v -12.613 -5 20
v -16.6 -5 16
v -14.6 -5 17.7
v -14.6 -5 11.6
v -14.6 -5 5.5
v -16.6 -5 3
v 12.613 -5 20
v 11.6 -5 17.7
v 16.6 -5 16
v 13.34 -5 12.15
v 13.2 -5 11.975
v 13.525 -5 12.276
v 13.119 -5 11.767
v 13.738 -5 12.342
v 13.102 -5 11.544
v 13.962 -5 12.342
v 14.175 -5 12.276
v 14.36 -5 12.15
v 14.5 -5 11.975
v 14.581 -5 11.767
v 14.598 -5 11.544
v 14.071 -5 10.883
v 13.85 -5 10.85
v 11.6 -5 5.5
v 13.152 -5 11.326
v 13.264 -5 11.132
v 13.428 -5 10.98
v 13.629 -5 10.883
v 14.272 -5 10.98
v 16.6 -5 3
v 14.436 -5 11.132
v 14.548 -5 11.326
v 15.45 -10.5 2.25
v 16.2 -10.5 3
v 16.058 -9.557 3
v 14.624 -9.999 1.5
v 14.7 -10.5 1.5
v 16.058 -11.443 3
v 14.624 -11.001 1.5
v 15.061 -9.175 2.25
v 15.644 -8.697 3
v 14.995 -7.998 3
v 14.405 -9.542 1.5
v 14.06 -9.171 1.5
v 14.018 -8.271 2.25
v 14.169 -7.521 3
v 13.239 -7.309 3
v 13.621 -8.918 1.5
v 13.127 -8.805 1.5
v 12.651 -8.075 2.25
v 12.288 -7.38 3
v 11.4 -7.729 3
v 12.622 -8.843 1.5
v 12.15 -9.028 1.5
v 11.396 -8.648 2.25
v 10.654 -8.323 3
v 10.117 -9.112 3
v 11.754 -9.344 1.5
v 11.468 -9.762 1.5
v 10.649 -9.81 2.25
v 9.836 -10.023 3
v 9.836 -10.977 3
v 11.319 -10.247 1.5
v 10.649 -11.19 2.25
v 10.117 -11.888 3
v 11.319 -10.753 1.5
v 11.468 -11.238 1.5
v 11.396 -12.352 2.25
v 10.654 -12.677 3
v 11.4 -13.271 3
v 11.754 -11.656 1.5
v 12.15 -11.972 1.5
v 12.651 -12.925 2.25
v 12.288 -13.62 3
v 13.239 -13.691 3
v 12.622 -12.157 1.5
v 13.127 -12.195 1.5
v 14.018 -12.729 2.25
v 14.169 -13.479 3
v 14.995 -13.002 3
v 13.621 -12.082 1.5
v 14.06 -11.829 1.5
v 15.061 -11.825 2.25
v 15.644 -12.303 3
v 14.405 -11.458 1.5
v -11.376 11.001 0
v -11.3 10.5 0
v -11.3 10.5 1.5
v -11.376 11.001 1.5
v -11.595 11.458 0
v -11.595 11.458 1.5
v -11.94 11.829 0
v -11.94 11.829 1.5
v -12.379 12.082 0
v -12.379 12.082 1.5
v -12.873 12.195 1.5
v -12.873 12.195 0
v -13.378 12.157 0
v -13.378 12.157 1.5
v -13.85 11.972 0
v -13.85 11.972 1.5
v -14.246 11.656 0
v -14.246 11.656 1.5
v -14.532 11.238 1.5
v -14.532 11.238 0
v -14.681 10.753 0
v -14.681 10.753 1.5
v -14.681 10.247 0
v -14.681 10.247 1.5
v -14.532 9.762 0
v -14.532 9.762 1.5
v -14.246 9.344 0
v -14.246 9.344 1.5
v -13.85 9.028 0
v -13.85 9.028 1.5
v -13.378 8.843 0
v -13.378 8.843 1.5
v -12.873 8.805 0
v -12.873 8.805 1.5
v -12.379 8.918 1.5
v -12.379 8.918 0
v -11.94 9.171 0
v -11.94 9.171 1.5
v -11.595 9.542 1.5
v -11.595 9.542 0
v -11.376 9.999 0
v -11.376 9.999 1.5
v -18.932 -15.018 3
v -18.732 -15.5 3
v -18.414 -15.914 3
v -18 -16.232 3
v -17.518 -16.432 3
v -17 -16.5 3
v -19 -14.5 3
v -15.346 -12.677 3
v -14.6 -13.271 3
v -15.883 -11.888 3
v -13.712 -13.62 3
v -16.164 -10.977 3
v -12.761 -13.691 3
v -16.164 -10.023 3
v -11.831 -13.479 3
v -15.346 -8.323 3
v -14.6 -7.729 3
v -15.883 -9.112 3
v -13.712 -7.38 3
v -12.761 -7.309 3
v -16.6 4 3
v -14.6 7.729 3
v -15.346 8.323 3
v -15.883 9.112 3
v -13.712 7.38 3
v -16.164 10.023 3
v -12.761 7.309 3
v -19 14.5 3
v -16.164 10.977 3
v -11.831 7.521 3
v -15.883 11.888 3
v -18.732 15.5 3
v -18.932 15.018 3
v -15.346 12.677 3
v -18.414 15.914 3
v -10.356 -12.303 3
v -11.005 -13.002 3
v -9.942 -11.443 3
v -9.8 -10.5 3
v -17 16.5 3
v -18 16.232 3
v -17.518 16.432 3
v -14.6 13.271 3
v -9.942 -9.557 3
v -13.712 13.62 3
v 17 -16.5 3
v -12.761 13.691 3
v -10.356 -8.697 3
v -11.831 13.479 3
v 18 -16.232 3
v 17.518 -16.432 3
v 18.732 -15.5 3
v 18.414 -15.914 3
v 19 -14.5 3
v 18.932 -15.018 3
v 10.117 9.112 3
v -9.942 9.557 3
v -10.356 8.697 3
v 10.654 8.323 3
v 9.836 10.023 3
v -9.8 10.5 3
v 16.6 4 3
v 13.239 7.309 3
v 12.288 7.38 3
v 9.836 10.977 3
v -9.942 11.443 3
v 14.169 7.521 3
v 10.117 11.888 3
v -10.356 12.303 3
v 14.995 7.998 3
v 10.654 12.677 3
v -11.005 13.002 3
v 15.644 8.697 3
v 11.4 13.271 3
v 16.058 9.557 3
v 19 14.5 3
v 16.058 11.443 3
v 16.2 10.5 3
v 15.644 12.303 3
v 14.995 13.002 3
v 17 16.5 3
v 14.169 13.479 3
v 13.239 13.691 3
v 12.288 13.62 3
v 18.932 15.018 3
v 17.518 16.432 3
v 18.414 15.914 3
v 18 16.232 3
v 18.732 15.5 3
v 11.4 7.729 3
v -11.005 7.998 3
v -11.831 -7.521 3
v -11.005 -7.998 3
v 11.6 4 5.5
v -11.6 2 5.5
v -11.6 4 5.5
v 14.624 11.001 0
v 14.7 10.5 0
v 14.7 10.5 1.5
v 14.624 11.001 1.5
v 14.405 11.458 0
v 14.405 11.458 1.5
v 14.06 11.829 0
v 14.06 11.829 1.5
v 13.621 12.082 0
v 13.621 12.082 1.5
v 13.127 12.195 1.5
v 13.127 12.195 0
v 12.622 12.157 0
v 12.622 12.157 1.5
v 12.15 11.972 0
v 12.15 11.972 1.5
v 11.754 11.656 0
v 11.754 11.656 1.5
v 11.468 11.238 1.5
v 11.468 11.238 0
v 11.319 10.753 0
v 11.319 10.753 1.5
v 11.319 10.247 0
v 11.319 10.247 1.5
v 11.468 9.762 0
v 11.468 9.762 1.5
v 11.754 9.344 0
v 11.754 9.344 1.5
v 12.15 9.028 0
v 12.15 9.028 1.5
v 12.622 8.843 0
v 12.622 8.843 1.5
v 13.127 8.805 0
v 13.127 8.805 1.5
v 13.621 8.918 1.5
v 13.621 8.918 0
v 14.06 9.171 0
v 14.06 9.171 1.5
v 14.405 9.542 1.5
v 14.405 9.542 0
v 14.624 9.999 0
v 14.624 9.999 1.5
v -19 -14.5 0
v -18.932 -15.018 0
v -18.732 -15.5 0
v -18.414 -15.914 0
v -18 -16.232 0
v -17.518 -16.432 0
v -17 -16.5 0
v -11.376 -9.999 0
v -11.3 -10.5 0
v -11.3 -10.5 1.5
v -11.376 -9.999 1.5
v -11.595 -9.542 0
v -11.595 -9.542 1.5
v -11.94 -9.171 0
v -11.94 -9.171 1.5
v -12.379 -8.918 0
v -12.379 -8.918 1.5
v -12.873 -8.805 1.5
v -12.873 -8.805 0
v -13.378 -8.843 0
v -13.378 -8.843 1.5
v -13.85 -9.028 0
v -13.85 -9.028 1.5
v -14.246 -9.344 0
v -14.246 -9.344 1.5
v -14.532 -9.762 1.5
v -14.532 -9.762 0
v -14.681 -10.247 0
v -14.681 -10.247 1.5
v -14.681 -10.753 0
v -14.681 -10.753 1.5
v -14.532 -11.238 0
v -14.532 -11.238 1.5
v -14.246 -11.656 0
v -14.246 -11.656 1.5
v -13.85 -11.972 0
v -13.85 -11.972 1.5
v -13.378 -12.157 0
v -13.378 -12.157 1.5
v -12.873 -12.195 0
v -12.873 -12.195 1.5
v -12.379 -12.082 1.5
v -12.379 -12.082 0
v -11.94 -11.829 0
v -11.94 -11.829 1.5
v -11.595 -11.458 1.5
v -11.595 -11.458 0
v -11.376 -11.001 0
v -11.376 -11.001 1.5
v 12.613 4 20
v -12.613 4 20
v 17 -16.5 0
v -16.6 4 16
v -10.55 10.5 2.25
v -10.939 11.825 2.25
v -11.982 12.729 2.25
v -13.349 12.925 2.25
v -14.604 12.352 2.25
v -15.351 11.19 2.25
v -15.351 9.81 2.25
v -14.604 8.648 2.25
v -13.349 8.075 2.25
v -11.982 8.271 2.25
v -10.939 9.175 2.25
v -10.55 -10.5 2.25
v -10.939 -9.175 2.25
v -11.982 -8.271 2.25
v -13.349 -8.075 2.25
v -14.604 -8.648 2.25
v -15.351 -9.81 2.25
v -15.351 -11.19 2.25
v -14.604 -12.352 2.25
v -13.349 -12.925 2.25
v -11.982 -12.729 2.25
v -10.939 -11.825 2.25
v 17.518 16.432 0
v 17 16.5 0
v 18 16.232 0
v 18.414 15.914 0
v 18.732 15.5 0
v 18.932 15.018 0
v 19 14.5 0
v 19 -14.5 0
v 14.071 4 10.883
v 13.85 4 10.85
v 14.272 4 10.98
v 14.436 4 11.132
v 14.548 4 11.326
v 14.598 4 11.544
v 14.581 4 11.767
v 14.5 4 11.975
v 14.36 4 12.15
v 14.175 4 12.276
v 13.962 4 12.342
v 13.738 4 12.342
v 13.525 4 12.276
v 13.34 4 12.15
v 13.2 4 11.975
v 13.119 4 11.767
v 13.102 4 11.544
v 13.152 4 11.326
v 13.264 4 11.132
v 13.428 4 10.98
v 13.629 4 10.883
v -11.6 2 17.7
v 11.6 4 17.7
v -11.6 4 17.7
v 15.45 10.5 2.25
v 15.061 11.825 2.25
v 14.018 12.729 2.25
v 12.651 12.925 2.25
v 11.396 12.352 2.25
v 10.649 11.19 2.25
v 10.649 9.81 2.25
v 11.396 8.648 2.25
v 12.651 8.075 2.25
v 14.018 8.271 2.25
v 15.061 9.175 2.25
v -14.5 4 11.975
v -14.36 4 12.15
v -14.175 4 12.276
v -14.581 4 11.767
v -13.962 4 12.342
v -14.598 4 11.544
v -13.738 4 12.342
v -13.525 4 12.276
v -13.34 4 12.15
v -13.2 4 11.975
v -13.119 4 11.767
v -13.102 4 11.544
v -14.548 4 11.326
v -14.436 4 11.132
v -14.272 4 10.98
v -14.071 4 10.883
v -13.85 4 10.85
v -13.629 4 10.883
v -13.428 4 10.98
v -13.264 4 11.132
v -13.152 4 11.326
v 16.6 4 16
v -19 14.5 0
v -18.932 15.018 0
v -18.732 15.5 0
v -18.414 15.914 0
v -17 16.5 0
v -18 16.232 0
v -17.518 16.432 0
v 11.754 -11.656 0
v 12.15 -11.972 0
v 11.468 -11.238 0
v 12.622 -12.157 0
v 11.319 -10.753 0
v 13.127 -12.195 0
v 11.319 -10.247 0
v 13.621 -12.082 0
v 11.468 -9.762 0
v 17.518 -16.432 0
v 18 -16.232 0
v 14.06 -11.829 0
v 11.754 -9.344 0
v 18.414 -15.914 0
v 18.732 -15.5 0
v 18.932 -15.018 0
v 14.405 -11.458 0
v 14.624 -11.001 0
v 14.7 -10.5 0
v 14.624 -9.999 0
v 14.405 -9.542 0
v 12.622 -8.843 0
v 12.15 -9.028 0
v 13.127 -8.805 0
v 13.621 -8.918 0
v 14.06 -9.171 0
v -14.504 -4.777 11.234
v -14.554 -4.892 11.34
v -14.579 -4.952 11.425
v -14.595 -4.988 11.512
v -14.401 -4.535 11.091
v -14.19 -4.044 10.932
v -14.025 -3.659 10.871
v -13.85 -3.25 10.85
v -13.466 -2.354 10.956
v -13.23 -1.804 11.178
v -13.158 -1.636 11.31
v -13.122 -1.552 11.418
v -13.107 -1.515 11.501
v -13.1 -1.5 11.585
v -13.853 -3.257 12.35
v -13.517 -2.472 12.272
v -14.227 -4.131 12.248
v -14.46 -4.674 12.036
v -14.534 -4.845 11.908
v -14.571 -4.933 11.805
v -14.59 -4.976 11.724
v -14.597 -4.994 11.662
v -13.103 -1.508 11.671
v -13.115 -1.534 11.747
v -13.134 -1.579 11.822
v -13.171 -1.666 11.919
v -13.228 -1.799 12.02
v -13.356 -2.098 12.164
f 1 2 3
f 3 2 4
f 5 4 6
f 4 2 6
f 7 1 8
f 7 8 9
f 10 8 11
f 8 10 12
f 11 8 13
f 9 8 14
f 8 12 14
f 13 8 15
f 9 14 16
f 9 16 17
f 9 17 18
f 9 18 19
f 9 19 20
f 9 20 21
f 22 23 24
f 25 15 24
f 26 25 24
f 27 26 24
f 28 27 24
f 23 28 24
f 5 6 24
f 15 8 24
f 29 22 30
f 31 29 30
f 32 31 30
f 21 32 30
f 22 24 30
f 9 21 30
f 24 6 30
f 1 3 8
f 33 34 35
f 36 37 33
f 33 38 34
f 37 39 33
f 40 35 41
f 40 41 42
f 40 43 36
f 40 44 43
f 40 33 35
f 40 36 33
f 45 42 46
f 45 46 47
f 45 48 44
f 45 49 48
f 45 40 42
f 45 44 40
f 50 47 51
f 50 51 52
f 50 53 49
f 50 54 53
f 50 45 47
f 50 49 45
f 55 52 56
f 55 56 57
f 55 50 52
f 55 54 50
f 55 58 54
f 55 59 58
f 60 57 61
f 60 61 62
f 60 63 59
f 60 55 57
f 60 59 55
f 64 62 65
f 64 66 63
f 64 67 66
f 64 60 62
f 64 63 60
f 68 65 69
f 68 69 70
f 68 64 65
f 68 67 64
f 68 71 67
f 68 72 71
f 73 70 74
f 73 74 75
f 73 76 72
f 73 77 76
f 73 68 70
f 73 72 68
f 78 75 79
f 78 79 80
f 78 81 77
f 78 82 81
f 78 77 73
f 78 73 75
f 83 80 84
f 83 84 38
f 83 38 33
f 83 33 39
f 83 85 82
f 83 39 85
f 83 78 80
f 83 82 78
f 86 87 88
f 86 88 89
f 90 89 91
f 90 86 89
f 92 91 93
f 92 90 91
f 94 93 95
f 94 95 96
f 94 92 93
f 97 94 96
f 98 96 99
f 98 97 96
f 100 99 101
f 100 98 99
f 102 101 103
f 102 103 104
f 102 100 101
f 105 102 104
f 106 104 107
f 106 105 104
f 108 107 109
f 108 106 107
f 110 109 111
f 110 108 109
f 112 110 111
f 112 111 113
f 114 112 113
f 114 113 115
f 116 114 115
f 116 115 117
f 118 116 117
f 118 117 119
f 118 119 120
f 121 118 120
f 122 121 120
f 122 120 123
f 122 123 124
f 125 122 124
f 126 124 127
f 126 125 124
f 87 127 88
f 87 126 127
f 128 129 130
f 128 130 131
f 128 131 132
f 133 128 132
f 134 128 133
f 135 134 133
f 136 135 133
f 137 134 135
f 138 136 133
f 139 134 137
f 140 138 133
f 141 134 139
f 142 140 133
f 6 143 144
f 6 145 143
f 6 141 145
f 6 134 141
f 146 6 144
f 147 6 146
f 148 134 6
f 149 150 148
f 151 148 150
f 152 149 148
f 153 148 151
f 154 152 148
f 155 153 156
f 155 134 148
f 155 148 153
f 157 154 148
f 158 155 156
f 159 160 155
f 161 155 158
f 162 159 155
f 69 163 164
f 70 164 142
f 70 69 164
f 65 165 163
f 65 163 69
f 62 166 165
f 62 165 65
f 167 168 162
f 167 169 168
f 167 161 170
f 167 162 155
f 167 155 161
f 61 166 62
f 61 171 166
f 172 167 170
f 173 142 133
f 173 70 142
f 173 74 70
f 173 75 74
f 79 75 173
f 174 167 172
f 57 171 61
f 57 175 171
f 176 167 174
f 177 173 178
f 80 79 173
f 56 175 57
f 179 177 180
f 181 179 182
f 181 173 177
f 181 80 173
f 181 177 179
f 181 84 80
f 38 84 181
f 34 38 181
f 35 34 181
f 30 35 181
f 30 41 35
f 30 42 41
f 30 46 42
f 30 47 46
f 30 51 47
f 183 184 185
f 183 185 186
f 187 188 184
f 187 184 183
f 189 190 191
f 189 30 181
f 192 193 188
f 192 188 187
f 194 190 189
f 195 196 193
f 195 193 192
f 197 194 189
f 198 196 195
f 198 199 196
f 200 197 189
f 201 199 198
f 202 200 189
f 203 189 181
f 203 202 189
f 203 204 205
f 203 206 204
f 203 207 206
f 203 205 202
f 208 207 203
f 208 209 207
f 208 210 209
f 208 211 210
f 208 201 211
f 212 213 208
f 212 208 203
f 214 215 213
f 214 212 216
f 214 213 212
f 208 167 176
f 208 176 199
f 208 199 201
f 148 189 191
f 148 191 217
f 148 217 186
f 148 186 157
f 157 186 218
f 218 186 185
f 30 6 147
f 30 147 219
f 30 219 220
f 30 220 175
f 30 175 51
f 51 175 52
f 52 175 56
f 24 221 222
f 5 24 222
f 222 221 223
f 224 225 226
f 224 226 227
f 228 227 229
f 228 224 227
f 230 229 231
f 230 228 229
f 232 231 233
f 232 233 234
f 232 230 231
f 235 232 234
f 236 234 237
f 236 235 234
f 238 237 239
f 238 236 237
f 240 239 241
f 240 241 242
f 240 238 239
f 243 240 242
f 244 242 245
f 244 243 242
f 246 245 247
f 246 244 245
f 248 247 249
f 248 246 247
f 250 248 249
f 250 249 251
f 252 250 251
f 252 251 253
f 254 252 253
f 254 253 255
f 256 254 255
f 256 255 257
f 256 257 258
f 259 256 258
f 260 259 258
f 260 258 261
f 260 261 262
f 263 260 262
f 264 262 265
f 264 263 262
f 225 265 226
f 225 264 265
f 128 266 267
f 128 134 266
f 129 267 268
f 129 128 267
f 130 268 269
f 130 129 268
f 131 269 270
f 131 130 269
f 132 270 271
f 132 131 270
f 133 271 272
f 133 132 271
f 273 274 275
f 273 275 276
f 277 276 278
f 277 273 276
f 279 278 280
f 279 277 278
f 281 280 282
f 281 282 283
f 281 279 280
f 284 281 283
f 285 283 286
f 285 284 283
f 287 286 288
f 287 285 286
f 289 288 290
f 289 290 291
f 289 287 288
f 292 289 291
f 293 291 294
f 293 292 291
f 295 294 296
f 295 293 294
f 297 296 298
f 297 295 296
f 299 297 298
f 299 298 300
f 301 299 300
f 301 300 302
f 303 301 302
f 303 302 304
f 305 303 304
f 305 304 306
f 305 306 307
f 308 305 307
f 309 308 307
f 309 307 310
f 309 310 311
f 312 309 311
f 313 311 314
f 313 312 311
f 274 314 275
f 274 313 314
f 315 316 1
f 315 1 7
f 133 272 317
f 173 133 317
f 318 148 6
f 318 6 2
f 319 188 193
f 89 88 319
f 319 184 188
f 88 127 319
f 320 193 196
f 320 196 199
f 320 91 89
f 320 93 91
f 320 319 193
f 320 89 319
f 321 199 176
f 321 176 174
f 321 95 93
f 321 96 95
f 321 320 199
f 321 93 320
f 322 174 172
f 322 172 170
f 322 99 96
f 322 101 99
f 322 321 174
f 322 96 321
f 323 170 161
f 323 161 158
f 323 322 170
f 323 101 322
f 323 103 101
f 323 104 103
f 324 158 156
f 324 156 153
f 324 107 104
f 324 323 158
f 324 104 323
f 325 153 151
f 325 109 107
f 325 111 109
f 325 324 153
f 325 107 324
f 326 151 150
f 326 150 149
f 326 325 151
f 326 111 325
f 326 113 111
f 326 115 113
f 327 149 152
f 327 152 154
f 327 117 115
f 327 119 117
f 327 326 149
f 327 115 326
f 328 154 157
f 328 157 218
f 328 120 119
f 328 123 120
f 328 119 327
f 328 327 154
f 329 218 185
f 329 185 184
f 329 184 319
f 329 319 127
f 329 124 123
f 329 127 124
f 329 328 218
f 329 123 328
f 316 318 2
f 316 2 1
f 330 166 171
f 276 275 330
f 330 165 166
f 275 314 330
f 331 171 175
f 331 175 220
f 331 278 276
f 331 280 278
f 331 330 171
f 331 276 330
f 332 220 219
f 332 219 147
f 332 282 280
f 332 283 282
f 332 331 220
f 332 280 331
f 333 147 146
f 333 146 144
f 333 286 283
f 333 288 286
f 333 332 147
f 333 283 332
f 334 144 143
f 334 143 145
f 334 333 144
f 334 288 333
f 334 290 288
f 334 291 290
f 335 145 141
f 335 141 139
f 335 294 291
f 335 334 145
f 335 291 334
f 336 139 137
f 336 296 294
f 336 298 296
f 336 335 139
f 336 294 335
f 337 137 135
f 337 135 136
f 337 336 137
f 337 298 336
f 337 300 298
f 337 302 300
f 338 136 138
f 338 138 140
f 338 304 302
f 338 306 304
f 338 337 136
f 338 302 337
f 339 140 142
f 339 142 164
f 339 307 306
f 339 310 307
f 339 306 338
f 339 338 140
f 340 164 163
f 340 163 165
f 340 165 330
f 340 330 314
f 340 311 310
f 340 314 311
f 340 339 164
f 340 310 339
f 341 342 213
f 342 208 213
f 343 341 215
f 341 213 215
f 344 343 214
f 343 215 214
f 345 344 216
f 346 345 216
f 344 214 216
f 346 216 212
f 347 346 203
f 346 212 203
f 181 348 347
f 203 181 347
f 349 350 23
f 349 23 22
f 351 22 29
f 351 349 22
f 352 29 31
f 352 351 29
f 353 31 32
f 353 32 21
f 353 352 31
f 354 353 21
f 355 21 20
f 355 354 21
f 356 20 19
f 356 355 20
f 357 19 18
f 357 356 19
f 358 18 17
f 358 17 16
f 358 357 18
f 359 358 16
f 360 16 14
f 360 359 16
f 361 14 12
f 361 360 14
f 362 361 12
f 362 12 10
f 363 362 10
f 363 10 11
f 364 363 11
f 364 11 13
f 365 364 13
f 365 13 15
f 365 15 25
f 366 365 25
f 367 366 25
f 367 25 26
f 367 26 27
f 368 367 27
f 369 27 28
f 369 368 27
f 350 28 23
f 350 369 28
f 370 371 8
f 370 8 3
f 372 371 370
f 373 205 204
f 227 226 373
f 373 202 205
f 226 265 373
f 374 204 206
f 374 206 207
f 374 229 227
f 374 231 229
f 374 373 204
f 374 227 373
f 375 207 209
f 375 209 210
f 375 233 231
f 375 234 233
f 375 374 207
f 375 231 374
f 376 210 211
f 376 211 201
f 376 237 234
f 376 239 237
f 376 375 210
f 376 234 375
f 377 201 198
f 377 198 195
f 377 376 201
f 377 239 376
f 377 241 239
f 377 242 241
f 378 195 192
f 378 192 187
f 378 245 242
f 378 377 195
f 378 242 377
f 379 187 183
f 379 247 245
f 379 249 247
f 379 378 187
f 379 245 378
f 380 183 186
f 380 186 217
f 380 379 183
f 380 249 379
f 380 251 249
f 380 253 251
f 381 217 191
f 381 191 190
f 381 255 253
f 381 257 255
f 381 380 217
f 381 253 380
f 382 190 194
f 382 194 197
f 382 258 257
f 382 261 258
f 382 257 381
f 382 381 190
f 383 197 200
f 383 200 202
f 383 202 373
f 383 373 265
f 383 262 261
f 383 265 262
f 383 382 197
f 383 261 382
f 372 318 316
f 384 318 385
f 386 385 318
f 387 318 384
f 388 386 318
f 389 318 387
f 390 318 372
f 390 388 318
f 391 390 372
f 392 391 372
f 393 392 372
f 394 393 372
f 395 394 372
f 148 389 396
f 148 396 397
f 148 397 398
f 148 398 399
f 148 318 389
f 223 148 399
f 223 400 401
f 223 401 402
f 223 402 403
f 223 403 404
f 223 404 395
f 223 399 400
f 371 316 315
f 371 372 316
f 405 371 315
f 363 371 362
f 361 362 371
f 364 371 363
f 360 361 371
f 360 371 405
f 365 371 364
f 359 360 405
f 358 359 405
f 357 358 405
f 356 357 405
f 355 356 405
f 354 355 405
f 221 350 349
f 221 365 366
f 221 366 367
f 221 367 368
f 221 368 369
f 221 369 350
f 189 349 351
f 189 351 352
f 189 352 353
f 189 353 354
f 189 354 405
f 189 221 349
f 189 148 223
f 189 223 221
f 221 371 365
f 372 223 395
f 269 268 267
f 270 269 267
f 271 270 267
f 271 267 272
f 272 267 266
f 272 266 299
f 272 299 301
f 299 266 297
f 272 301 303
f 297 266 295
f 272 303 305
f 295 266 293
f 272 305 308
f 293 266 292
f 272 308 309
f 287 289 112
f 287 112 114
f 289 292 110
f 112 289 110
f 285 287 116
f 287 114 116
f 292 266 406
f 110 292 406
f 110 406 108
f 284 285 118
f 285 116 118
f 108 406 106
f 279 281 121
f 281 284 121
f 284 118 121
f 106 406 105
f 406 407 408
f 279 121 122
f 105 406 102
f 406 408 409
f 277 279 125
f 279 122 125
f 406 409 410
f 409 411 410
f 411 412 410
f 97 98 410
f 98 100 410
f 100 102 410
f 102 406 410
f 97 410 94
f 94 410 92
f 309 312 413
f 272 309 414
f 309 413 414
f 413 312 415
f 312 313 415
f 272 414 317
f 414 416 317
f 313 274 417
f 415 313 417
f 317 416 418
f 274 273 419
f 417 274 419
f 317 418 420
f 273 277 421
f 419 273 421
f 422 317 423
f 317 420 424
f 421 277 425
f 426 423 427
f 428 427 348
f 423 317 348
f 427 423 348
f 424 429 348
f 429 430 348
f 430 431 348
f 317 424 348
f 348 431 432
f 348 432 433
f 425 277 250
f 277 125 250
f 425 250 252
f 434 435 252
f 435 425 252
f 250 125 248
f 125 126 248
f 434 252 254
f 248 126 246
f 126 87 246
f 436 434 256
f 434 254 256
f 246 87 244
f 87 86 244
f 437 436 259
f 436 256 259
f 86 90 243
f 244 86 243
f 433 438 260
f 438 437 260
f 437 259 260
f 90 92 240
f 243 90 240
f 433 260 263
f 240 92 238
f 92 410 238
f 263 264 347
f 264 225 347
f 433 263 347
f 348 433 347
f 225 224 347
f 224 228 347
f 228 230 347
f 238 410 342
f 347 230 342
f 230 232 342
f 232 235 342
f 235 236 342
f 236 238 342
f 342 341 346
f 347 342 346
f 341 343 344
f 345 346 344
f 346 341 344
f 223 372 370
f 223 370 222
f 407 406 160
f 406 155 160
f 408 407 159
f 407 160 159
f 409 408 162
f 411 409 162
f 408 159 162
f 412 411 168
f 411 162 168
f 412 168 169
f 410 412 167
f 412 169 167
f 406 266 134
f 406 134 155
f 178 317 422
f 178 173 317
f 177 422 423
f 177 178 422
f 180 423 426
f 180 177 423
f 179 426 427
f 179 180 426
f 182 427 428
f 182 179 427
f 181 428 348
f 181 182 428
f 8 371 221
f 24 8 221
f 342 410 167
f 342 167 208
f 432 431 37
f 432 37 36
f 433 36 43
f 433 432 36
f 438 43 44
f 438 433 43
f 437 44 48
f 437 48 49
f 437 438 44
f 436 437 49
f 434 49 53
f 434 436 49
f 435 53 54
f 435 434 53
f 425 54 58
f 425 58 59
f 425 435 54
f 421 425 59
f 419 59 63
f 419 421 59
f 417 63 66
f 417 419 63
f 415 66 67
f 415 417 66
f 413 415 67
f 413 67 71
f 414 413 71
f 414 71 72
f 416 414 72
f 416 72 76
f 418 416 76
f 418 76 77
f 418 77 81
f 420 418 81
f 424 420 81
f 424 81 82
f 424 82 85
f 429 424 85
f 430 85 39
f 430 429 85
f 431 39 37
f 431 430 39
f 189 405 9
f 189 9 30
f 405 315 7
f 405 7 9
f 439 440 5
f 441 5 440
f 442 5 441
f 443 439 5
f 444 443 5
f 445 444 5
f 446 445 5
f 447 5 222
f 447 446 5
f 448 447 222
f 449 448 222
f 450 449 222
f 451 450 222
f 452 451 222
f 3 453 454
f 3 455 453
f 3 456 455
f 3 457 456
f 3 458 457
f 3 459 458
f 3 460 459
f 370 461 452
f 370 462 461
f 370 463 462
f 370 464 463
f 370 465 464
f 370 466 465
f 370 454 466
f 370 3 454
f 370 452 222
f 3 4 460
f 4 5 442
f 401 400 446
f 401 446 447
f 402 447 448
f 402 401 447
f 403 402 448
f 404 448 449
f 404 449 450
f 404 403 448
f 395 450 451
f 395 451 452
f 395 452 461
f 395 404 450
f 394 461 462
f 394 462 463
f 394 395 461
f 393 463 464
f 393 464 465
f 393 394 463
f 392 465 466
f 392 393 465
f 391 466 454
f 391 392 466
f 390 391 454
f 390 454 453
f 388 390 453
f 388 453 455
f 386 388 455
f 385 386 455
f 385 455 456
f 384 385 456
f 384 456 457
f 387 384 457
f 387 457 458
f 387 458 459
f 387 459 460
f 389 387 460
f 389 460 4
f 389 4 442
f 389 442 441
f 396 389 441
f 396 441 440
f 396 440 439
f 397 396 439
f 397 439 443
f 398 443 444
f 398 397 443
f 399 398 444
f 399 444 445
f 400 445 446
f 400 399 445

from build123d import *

# Parameters (mm, degrees)
SKETCH1_W                = 38
SKETCH1_H                = 33
SKETCH1_R                = 1.7
BOSS_EXTRUDE1_DEPTH      = 3
BOSS_EXTRUDE2_DEPTH      = 5
BOSS_EXTRUDE2_DEPTH_BACK = 4
SKETCH3_R                = 0.75
SKETCH3_W                = 23.2
SKETCH3_H                = 12.2
FILLET1_R                = 2
CHAMFER1_SIZE            = 1.5
CHAMFER2_SIZE            = 3
CHAMFER2_SIZE_2          = 7


with BuildPart() as part:
    # Sketch1 → Boss-Extrude1 (new body)
    with BuildSketch(Plane.XY):
        Rectangle(SKETCH1_W, SKETCH1_H)
        with Locations((-13, 10.5)):
            Circle(SKETCH1_R, mode=Mode.SUBTRACT)
        with Locations((13, 10.5)):
            Circle(SKETCH1_R, mode=Mode.SUBTRACT)
        with Locations((13, -10.5)):
            Circle(SKETCH1_R, mode=Mode.SUBTRACT)
        with Locations((-13, -10.5)):
            Circle(SKETCH1_R, mode=Mode.SUBTRACT)
    extrude(amount=BOSS_EXTRUDE1_DEPTH)

    # Sketch3 → Boss-Extrude2 (add, two sides: drawn at the far end of the back side and taken through both)
    with BuildSketch(Plane(origin=(0, 0, 0), x_dir=(-1, 0, 0), z_dir=(0, -1, 0)).offset(-BOSS_EXTRUDE2_DEPTH_BACK)):
        Polygon((16.6, -3), (16.6, -16), (12.612805852, -20), (-12.612805852, -20), (-16.6, -16), (-16.6, -3), align=None)
        with Locations(Location((-13.85, -11.6, 0), (0, 0, 90))):
            Circle(SKETCH3_R, mode=Mode.SUBTRACT)
        with Locations(Location((13.85, -11.6, 0), (0, 0, 90))):
            Circle(SKETCH3_R, mode=Mode.SUBTRACT)
        with Locations((0, -11.6)):
            Rectangle(SKETCH3_W, SKETCH3_H, mode=Mode.SUBTRACT)
    extrude(amount=BOSS_EXTRUDE2_DEPTH + BOSS_EXTRUDE2_DEPTH_BACK)

    # Fillet1
    fillet1_edges = [part.edges().sort_by_distance(p)[0] for p in [
        (19, -16.5, 1.5),
        (-19, -16.5, 1.5),
        (-19, 16.5, 1.5),
        (19, 16.5, 1.5),
    ]]
    fillet(fillet1_edges, radius=FILLET1_R)

    # Chamfer1
    chamfer1_edges = [part.edges().sort_by_distance(p)[0] for p in [
        (-14.7, 10.5, 3),
        (11.3, 10.5, 3),
        (11.3, -10.5, 3),
        (-14.7, -10.5, 3),
    ]]
    chamfer(chamfer1_edges, length=CHAMFER1_SIZE)

    # Chamfer2
    # the kernel refuses this chamfer: 7, 3 mm, written as the material it takes off along each edge
    with BuildSketch(Plane(origin=(-11.6, -5, 17.7), x_dir=(-0.9965941369752023, -0.08246287738523173, 0), z_dir=(0, 0, -1))) as chamfer2_piece_1:
        Polygon((CHAMFER2_SIZE * 0.996594136975, CHAMFER2_SIZE * 0.0824628773852), (-CHAMFER2_SIZE_2 * 0.0824628773852, CHAMFER2_SIZE_2 * 0.996594136975), (0, 0), align=None)
    extrude(amount=12.2, mode=Mode.SUBTRACT)


solid = part.part
